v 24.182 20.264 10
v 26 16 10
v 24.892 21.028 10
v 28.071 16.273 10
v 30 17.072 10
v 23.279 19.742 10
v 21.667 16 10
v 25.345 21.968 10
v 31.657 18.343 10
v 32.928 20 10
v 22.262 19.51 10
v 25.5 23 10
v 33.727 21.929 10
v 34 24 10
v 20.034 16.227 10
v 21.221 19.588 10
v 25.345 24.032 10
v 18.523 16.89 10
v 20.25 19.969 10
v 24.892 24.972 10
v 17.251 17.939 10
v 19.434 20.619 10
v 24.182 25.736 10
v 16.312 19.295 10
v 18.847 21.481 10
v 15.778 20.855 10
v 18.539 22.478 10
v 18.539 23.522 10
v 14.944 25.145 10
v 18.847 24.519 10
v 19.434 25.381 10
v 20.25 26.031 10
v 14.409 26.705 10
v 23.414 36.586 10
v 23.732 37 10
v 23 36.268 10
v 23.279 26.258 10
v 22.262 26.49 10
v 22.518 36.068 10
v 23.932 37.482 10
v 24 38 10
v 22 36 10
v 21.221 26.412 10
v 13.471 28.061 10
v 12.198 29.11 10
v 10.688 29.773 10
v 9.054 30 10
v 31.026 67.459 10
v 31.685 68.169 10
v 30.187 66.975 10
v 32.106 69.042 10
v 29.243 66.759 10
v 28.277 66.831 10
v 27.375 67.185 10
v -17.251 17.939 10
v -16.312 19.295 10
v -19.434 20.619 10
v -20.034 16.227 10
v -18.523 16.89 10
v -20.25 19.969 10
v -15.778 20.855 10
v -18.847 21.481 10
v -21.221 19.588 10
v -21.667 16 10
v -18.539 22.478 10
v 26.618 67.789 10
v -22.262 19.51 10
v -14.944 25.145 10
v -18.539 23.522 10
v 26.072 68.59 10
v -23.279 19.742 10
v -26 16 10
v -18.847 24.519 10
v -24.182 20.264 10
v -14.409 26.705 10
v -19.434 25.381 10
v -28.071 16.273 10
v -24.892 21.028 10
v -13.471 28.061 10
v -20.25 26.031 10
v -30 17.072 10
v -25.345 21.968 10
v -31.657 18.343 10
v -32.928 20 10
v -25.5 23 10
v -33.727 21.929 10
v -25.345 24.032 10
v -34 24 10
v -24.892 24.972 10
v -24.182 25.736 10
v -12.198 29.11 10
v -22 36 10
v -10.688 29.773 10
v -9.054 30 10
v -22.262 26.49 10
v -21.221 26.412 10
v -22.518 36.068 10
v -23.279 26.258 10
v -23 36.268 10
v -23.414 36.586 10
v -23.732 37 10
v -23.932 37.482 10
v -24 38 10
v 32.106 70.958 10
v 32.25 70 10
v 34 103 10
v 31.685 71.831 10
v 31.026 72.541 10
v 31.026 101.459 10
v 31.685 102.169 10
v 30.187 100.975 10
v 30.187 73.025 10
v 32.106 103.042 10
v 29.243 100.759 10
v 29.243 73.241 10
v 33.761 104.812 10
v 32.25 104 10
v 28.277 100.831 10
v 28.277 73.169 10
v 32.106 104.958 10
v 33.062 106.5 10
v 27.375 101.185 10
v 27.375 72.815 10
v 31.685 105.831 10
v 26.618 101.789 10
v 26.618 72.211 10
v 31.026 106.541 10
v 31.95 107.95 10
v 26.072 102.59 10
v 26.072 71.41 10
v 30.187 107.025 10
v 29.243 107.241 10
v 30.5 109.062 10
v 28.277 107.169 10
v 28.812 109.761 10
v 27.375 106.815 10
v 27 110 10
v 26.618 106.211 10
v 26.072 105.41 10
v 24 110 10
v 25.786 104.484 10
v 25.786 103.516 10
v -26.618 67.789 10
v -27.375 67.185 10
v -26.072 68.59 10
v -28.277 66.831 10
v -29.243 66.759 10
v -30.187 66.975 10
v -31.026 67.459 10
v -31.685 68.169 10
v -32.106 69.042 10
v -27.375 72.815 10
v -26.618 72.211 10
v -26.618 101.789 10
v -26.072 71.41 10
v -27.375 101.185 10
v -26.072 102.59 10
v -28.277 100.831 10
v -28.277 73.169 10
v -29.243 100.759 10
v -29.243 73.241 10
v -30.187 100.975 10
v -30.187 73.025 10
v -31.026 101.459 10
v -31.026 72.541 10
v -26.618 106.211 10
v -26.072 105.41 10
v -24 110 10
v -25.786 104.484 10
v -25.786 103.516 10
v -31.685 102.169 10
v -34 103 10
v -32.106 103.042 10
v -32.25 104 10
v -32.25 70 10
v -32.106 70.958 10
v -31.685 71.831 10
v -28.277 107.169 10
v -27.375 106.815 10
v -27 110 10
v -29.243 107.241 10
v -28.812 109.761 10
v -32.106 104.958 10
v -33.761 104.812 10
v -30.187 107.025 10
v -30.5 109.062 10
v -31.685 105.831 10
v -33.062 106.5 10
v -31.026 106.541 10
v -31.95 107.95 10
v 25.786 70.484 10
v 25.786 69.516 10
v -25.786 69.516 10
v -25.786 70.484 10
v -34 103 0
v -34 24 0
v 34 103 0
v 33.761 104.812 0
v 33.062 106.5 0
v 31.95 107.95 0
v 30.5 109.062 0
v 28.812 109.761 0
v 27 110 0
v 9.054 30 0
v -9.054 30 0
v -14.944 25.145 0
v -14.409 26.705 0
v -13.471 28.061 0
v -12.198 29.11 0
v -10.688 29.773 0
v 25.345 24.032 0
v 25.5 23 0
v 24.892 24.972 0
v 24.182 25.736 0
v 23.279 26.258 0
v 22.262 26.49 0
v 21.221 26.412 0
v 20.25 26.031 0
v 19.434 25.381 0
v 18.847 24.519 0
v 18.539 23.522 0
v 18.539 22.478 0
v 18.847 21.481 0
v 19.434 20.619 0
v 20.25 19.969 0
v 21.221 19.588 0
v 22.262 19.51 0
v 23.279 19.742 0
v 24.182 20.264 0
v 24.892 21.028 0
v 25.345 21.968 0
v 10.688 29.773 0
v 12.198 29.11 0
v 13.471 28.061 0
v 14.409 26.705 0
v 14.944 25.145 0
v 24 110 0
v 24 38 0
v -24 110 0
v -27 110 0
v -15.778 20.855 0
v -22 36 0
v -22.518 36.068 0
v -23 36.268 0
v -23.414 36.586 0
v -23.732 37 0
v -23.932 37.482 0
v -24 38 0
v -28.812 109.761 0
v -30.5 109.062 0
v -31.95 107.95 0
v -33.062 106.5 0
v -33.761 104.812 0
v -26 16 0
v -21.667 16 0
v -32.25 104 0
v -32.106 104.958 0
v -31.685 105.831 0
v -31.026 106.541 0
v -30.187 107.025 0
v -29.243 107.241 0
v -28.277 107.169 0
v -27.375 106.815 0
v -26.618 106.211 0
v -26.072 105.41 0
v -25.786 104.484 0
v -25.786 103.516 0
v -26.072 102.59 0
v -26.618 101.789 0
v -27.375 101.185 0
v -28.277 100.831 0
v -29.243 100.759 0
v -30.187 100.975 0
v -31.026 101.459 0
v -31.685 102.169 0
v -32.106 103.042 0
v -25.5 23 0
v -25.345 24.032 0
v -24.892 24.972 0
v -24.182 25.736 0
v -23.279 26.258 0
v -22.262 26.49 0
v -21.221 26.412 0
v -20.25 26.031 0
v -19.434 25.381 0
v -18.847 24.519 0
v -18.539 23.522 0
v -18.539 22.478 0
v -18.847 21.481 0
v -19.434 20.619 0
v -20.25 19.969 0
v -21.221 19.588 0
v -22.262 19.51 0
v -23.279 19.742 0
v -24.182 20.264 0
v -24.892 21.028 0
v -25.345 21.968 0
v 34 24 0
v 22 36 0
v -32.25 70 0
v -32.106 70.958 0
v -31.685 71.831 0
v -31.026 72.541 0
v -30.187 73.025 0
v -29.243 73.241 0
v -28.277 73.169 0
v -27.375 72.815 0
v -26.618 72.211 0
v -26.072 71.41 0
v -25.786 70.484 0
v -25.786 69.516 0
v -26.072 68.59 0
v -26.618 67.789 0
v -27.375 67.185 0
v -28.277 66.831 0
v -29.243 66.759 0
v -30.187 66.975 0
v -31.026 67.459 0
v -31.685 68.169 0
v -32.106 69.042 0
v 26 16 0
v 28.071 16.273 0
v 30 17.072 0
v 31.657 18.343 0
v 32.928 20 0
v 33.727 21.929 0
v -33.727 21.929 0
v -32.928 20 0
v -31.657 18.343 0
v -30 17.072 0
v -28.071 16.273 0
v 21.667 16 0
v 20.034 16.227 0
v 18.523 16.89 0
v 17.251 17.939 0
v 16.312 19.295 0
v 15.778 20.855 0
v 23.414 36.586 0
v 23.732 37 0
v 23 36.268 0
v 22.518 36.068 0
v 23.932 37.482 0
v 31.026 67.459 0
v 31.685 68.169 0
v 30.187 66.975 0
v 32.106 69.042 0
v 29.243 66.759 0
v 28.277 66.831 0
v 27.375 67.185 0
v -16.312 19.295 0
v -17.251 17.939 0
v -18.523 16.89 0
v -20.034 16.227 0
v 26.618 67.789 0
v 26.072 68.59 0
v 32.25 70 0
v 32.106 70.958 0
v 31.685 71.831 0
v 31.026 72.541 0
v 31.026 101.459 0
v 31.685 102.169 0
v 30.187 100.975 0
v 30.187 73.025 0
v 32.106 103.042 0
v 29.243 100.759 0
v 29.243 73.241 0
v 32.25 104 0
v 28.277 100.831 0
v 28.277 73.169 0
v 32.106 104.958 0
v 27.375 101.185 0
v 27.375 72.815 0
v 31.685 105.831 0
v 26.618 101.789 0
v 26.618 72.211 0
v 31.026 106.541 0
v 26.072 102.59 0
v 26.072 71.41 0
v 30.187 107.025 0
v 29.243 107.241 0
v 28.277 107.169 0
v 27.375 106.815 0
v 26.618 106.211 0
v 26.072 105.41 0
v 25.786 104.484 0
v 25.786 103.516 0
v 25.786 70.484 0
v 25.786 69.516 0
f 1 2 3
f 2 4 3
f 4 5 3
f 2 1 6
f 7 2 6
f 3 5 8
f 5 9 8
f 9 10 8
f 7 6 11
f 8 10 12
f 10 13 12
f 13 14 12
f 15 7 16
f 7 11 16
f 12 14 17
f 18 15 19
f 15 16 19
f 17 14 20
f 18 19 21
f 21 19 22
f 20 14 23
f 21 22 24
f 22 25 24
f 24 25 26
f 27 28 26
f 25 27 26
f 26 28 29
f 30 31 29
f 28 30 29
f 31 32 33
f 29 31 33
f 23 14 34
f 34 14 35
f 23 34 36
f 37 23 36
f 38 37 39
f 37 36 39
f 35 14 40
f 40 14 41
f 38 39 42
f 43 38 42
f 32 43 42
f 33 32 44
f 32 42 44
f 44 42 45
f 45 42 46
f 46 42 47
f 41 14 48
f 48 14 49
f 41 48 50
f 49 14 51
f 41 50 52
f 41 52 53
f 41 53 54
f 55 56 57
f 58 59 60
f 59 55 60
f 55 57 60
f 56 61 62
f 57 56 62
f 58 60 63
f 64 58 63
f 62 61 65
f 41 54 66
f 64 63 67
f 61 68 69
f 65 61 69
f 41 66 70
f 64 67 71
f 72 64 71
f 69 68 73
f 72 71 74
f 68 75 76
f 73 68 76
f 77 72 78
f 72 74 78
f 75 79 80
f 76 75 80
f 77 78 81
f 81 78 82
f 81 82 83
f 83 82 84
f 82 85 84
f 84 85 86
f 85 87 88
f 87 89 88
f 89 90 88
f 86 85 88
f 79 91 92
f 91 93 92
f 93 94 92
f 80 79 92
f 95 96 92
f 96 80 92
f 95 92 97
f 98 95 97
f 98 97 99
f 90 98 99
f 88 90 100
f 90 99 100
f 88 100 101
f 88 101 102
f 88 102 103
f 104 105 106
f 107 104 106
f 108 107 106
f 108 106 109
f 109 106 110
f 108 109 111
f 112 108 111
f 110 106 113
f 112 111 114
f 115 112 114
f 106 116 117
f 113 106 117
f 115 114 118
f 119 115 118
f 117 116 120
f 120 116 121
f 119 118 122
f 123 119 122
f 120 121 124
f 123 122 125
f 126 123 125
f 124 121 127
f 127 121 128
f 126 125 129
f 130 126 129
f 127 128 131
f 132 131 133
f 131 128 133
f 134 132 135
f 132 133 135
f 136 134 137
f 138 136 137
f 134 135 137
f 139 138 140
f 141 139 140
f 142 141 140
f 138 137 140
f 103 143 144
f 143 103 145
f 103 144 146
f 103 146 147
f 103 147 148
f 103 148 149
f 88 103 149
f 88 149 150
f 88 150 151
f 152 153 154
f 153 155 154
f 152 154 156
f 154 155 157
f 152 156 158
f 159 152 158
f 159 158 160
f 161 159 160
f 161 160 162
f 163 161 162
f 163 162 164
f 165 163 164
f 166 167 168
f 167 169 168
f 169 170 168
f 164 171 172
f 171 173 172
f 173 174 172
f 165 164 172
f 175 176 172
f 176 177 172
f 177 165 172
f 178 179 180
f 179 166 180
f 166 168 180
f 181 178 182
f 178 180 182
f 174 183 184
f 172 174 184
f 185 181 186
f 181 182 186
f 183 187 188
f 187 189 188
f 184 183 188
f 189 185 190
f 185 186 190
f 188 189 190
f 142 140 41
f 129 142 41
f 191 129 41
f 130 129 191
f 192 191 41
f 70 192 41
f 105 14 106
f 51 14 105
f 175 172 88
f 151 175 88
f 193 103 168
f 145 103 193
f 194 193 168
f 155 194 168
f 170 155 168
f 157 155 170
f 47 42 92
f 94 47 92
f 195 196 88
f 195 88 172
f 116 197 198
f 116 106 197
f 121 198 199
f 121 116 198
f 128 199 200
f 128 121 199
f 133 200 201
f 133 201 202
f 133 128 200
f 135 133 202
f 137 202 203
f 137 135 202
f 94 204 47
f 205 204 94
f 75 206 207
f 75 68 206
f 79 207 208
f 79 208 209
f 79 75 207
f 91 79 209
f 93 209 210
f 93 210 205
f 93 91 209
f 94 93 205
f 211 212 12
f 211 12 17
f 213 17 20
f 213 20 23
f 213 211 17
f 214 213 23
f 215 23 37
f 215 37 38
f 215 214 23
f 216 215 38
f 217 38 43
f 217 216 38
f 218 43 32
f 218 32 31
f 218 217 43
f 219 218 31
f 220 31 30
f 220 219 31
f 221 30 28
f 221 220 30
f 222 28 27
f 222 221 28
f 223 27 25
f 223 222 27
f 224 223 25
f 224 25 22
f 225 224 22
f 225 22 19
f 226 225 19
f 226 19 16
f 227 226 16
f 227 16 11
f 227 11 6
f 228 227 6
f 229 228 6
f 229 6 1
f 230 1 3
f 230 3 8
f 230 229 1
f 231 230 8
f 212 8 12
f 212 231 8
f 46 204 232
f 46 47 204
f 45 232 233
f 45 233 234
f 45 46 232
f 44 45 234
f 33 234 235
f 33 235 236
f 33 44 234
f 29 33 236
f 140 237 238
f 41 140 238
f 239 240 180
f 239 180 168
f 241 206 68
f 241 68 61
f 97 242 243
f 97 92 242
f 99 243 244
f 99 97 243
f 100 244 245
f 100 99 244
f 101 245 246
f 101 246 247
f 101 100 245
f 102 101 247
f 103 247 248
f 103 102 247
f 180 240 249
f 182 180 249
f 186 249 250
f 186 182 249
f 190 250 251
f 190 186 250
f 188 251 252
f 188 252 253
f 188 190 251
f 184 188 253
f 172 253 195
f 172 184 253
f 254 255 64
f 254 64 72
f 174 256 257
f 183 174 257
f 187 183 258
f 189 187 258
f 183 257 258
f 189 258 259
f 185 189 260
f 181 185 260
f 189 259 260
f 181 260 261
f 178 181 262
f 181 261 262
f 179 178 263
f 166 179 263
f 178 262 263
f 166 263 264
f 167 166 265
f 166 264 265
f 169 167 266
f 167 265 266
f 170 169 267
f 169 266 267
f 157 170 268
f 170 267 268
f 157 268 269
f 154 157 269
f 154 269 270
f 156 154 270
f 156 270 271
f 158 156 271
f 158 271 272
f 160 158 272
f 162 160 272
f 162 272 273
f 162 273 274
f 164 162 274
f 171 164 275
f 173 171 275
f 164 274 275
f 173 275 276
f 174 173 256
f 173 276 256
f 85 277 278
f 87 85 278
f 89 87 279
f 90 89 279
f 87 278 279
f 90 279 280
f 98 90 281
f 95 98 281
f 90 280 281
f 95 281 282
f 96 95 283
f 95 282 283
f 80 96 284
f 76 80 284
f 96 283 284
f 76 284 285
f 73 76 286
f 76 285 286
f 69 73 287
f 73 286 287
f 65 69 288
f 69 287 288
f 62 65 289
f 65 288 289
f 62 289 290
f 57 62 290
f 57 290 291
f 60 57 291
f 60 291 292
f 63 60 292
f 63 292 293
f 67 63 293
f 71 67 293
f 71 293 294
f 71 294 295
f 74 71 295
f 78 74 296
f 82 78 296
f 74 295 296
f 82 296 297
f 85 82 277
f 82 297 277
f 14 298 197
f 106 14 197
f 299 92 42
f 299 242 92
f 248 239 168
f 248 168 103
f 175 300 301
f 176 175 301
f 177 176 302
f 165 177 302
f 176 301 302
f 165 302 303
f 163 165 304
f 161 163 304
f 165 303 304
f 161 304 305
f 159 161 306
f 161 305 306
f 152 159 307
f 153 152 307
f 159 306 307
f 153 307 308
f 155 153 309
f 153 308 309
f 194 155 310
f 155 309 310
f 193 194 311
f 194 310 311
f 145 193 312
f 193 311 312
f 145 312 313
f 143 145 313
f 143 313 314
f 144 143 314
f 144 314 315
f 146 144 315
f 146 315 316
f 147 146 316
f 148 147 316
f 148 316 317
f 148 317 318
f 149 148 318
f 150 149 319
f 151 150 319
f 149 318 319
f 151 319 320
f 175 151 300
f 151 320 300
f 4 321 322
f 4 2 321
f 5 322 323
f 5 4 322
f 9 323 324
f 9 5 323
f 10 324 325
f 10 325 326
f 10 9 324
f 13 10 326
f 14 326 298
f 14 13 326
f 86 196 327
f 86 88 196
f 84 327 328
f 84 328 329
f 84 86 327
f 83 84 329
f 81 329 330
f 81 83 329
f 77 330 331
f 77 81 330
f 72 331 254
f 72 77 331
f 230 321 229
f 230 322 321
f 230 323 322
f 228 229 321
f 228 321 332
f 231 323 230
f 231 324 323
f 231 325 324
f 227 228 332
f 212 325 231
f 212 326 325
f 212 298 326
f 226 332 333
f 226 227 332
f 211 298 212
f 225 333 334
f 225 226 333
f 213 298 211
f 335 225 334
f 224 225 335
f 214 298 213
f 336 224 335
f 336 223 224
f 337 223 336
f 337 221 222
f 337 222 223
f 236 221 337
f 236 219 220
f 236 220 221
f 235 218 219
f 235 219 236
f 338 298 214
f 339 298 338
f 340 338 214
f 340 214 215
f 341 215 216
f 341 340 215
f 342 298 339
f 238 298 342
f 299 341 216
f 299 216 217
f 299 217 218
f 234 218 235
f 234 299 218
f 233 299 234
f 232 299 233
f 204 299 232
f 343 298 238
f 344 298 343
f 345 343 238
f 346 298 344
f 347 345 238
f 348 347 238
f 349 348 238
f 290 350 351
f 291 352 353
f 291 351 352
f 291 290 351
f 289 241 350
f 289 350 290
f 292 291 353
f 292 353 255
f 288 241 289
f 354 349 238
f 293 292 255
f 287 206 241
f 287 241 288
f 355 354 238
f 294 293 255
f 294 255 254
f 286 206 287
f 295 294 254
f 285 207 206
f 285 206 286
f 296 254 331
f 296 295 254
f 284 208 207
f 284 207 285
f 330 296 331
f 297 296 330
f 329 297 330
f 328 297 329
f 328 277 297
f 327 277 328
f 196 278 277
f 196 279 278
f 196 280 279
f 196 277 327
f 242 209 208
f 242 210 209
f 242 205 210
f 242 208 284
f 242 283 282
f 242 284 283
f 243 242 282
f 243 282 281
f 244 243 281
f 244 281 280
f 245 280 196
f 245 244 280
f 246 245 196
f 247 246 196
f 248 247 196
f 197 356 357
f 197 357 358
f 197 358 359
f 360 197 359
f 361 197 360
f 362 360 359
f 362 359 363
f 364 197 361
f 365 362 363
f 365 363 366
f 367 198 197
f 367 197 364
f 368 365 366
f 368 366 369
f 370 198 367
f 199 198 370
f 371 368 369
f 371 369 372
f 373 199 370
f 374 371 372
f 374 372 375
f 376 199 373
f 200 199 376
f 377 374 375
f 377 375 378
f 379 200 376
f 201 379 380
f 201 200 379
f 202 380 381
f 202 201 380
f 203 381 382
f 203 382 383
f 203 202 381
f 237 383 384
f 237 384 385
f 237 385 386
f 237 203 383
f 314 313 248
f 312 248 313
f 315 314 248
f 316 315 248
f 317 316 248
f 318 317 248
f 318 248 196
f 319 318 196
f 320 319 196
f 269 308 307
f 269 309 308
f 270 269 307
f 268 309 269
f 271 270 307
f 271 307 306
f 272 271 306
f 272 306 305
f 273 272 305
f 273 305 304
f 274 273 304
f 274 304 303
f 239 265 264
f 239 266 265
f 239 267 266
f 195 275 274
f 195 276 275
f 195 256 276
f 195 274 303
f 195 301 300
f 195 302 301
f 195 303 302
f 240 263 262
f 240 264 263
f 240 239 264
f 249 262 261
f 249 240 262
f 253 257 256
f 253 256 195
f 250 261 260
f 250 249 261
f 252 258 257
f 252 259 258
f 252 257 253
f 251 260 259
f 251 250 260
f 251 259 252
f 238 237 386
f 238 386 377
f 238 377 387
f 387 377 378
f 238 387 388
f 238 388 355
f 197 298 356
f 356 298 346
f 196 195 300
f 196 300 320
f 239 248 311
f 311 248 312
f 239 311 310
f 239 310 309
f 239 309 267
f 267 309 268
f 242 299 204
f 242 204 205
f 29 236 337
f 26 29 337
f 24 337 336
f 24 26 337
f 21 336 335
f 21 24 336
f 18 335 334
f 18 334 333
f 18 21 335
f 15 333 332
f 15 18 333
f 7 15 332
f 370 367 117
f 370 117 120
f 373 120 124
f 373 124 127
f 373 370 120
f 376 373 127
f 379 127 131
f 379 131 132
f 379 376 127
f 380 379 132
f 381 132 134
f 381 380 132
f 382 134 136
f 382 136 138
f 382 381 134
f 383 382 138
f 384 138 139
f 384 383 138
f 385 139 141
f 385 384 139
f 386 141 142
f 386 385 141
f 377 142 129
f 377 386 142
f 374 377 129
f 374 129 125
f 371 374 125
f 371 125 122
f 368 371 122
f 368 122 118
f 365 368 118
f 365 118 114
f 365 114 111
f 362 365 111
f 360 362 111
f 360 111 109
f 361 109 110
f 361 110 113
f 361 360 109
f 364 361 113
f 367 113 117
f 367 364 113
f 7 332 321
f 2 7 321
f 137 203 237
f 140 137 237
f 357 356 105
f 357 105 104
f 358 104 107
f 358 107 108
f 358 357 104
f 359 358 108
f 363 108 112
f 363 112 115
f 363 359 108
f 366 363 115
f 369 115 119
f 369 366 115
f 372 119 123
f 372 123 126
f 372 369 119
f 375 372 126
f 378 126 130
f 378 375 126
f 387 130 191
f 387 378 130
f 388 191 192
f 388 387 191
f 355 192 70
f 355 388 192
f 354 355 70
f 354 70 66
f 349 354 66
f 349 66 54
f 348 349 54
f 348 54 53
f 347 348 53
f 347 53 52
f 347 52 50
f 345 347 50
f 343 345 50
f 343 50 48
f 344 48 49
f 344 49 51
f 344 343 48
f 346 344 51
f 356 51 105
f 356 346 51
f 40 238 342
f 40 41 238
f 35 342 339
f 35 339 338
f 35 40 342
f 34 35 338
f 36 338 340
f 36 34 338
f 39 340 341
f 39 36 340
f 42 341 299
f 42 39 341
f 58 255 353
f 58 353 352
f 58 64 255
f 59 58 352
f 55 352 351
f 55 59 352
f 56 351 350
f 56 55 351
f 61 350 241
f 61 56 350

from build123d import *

# Parameters (mm, degrees)
ESQUISSE1_R        = 3.25
ESQUISSE1_R_2      = 3.5
BOSS_EXTRU_1_DEPTH = 10
CONG_1_R           = 6
CONG_2_R           = 8
CONG_3_R           = 7
CONG_4_R           = 2


with BuildPart() as part:
    # Esquisse1 → Boss.-Extru.1 (new body)
    with BuildSketch(Plane.XY):
        Polygon((24, 110), (24, 36), (0, 36), (0, 30), (14, 30), (16.721324328, 16), (34, 16), (34, 110), align=None)
        with Locations((29, 104)):
            Circle(ESQUISSE1_R, mode=Mode.SUBTRACT)
        with Locations((22, 23)):
            Circle(ESQUISSE1_R_2, mode=Mode.SUBTRACT)
        with Locations((29, 70)):
            Circle(ESQUISSE1_R, mode=Mode.SUBTRACT)
    boss_extru_1 = extrude(amount=BOSS_EXTRU_1_DEPTH)

    # Symétrie2: Boss.-Extru.1 across plane
    add(boss_extru_1.mirror(Plane(origin=(0, 36, 10), x_dir=(0, 0, 1), z_dir=(1, 0, 0))))

    # Congé1
    cong_1_edges = [part.edges().sort_by_distance(p)[0] for p in [
        (16.721324328, 16, 5),
        (14, 30, 5),
        (-14, 30, 5),
        (-16.721324328, 16, 5),
    ]]
    fillet(cong_1_edges, radius=CONG_1_R)

    # Congé2
    cong_2_edges = [part.edges().sort_by_distance(p)[0] for p in [
        (34, 16, 5),
        (-34, 16, 5),
    ]]
    fillet(cong_2_edges, radius=CONG_2_R)

    # Congé3
    cong_3_edges = [part.edges().sort_by_distance(p)[0] for p in [
        (34, 110, 5),
        (-34, 110, 5),
    ]]
    fillet(cong_3_edges, radius=CONG_3_R)

    # Congé4
    cong_4_edges = [part.edges().sort_by_distance(p)[0] for p in [
        (24, 36, 5),
        (-24, 36, 5),
    ]]
    fillet(cong_4_edges, radius=CONG_4_R)


solid = part.part
